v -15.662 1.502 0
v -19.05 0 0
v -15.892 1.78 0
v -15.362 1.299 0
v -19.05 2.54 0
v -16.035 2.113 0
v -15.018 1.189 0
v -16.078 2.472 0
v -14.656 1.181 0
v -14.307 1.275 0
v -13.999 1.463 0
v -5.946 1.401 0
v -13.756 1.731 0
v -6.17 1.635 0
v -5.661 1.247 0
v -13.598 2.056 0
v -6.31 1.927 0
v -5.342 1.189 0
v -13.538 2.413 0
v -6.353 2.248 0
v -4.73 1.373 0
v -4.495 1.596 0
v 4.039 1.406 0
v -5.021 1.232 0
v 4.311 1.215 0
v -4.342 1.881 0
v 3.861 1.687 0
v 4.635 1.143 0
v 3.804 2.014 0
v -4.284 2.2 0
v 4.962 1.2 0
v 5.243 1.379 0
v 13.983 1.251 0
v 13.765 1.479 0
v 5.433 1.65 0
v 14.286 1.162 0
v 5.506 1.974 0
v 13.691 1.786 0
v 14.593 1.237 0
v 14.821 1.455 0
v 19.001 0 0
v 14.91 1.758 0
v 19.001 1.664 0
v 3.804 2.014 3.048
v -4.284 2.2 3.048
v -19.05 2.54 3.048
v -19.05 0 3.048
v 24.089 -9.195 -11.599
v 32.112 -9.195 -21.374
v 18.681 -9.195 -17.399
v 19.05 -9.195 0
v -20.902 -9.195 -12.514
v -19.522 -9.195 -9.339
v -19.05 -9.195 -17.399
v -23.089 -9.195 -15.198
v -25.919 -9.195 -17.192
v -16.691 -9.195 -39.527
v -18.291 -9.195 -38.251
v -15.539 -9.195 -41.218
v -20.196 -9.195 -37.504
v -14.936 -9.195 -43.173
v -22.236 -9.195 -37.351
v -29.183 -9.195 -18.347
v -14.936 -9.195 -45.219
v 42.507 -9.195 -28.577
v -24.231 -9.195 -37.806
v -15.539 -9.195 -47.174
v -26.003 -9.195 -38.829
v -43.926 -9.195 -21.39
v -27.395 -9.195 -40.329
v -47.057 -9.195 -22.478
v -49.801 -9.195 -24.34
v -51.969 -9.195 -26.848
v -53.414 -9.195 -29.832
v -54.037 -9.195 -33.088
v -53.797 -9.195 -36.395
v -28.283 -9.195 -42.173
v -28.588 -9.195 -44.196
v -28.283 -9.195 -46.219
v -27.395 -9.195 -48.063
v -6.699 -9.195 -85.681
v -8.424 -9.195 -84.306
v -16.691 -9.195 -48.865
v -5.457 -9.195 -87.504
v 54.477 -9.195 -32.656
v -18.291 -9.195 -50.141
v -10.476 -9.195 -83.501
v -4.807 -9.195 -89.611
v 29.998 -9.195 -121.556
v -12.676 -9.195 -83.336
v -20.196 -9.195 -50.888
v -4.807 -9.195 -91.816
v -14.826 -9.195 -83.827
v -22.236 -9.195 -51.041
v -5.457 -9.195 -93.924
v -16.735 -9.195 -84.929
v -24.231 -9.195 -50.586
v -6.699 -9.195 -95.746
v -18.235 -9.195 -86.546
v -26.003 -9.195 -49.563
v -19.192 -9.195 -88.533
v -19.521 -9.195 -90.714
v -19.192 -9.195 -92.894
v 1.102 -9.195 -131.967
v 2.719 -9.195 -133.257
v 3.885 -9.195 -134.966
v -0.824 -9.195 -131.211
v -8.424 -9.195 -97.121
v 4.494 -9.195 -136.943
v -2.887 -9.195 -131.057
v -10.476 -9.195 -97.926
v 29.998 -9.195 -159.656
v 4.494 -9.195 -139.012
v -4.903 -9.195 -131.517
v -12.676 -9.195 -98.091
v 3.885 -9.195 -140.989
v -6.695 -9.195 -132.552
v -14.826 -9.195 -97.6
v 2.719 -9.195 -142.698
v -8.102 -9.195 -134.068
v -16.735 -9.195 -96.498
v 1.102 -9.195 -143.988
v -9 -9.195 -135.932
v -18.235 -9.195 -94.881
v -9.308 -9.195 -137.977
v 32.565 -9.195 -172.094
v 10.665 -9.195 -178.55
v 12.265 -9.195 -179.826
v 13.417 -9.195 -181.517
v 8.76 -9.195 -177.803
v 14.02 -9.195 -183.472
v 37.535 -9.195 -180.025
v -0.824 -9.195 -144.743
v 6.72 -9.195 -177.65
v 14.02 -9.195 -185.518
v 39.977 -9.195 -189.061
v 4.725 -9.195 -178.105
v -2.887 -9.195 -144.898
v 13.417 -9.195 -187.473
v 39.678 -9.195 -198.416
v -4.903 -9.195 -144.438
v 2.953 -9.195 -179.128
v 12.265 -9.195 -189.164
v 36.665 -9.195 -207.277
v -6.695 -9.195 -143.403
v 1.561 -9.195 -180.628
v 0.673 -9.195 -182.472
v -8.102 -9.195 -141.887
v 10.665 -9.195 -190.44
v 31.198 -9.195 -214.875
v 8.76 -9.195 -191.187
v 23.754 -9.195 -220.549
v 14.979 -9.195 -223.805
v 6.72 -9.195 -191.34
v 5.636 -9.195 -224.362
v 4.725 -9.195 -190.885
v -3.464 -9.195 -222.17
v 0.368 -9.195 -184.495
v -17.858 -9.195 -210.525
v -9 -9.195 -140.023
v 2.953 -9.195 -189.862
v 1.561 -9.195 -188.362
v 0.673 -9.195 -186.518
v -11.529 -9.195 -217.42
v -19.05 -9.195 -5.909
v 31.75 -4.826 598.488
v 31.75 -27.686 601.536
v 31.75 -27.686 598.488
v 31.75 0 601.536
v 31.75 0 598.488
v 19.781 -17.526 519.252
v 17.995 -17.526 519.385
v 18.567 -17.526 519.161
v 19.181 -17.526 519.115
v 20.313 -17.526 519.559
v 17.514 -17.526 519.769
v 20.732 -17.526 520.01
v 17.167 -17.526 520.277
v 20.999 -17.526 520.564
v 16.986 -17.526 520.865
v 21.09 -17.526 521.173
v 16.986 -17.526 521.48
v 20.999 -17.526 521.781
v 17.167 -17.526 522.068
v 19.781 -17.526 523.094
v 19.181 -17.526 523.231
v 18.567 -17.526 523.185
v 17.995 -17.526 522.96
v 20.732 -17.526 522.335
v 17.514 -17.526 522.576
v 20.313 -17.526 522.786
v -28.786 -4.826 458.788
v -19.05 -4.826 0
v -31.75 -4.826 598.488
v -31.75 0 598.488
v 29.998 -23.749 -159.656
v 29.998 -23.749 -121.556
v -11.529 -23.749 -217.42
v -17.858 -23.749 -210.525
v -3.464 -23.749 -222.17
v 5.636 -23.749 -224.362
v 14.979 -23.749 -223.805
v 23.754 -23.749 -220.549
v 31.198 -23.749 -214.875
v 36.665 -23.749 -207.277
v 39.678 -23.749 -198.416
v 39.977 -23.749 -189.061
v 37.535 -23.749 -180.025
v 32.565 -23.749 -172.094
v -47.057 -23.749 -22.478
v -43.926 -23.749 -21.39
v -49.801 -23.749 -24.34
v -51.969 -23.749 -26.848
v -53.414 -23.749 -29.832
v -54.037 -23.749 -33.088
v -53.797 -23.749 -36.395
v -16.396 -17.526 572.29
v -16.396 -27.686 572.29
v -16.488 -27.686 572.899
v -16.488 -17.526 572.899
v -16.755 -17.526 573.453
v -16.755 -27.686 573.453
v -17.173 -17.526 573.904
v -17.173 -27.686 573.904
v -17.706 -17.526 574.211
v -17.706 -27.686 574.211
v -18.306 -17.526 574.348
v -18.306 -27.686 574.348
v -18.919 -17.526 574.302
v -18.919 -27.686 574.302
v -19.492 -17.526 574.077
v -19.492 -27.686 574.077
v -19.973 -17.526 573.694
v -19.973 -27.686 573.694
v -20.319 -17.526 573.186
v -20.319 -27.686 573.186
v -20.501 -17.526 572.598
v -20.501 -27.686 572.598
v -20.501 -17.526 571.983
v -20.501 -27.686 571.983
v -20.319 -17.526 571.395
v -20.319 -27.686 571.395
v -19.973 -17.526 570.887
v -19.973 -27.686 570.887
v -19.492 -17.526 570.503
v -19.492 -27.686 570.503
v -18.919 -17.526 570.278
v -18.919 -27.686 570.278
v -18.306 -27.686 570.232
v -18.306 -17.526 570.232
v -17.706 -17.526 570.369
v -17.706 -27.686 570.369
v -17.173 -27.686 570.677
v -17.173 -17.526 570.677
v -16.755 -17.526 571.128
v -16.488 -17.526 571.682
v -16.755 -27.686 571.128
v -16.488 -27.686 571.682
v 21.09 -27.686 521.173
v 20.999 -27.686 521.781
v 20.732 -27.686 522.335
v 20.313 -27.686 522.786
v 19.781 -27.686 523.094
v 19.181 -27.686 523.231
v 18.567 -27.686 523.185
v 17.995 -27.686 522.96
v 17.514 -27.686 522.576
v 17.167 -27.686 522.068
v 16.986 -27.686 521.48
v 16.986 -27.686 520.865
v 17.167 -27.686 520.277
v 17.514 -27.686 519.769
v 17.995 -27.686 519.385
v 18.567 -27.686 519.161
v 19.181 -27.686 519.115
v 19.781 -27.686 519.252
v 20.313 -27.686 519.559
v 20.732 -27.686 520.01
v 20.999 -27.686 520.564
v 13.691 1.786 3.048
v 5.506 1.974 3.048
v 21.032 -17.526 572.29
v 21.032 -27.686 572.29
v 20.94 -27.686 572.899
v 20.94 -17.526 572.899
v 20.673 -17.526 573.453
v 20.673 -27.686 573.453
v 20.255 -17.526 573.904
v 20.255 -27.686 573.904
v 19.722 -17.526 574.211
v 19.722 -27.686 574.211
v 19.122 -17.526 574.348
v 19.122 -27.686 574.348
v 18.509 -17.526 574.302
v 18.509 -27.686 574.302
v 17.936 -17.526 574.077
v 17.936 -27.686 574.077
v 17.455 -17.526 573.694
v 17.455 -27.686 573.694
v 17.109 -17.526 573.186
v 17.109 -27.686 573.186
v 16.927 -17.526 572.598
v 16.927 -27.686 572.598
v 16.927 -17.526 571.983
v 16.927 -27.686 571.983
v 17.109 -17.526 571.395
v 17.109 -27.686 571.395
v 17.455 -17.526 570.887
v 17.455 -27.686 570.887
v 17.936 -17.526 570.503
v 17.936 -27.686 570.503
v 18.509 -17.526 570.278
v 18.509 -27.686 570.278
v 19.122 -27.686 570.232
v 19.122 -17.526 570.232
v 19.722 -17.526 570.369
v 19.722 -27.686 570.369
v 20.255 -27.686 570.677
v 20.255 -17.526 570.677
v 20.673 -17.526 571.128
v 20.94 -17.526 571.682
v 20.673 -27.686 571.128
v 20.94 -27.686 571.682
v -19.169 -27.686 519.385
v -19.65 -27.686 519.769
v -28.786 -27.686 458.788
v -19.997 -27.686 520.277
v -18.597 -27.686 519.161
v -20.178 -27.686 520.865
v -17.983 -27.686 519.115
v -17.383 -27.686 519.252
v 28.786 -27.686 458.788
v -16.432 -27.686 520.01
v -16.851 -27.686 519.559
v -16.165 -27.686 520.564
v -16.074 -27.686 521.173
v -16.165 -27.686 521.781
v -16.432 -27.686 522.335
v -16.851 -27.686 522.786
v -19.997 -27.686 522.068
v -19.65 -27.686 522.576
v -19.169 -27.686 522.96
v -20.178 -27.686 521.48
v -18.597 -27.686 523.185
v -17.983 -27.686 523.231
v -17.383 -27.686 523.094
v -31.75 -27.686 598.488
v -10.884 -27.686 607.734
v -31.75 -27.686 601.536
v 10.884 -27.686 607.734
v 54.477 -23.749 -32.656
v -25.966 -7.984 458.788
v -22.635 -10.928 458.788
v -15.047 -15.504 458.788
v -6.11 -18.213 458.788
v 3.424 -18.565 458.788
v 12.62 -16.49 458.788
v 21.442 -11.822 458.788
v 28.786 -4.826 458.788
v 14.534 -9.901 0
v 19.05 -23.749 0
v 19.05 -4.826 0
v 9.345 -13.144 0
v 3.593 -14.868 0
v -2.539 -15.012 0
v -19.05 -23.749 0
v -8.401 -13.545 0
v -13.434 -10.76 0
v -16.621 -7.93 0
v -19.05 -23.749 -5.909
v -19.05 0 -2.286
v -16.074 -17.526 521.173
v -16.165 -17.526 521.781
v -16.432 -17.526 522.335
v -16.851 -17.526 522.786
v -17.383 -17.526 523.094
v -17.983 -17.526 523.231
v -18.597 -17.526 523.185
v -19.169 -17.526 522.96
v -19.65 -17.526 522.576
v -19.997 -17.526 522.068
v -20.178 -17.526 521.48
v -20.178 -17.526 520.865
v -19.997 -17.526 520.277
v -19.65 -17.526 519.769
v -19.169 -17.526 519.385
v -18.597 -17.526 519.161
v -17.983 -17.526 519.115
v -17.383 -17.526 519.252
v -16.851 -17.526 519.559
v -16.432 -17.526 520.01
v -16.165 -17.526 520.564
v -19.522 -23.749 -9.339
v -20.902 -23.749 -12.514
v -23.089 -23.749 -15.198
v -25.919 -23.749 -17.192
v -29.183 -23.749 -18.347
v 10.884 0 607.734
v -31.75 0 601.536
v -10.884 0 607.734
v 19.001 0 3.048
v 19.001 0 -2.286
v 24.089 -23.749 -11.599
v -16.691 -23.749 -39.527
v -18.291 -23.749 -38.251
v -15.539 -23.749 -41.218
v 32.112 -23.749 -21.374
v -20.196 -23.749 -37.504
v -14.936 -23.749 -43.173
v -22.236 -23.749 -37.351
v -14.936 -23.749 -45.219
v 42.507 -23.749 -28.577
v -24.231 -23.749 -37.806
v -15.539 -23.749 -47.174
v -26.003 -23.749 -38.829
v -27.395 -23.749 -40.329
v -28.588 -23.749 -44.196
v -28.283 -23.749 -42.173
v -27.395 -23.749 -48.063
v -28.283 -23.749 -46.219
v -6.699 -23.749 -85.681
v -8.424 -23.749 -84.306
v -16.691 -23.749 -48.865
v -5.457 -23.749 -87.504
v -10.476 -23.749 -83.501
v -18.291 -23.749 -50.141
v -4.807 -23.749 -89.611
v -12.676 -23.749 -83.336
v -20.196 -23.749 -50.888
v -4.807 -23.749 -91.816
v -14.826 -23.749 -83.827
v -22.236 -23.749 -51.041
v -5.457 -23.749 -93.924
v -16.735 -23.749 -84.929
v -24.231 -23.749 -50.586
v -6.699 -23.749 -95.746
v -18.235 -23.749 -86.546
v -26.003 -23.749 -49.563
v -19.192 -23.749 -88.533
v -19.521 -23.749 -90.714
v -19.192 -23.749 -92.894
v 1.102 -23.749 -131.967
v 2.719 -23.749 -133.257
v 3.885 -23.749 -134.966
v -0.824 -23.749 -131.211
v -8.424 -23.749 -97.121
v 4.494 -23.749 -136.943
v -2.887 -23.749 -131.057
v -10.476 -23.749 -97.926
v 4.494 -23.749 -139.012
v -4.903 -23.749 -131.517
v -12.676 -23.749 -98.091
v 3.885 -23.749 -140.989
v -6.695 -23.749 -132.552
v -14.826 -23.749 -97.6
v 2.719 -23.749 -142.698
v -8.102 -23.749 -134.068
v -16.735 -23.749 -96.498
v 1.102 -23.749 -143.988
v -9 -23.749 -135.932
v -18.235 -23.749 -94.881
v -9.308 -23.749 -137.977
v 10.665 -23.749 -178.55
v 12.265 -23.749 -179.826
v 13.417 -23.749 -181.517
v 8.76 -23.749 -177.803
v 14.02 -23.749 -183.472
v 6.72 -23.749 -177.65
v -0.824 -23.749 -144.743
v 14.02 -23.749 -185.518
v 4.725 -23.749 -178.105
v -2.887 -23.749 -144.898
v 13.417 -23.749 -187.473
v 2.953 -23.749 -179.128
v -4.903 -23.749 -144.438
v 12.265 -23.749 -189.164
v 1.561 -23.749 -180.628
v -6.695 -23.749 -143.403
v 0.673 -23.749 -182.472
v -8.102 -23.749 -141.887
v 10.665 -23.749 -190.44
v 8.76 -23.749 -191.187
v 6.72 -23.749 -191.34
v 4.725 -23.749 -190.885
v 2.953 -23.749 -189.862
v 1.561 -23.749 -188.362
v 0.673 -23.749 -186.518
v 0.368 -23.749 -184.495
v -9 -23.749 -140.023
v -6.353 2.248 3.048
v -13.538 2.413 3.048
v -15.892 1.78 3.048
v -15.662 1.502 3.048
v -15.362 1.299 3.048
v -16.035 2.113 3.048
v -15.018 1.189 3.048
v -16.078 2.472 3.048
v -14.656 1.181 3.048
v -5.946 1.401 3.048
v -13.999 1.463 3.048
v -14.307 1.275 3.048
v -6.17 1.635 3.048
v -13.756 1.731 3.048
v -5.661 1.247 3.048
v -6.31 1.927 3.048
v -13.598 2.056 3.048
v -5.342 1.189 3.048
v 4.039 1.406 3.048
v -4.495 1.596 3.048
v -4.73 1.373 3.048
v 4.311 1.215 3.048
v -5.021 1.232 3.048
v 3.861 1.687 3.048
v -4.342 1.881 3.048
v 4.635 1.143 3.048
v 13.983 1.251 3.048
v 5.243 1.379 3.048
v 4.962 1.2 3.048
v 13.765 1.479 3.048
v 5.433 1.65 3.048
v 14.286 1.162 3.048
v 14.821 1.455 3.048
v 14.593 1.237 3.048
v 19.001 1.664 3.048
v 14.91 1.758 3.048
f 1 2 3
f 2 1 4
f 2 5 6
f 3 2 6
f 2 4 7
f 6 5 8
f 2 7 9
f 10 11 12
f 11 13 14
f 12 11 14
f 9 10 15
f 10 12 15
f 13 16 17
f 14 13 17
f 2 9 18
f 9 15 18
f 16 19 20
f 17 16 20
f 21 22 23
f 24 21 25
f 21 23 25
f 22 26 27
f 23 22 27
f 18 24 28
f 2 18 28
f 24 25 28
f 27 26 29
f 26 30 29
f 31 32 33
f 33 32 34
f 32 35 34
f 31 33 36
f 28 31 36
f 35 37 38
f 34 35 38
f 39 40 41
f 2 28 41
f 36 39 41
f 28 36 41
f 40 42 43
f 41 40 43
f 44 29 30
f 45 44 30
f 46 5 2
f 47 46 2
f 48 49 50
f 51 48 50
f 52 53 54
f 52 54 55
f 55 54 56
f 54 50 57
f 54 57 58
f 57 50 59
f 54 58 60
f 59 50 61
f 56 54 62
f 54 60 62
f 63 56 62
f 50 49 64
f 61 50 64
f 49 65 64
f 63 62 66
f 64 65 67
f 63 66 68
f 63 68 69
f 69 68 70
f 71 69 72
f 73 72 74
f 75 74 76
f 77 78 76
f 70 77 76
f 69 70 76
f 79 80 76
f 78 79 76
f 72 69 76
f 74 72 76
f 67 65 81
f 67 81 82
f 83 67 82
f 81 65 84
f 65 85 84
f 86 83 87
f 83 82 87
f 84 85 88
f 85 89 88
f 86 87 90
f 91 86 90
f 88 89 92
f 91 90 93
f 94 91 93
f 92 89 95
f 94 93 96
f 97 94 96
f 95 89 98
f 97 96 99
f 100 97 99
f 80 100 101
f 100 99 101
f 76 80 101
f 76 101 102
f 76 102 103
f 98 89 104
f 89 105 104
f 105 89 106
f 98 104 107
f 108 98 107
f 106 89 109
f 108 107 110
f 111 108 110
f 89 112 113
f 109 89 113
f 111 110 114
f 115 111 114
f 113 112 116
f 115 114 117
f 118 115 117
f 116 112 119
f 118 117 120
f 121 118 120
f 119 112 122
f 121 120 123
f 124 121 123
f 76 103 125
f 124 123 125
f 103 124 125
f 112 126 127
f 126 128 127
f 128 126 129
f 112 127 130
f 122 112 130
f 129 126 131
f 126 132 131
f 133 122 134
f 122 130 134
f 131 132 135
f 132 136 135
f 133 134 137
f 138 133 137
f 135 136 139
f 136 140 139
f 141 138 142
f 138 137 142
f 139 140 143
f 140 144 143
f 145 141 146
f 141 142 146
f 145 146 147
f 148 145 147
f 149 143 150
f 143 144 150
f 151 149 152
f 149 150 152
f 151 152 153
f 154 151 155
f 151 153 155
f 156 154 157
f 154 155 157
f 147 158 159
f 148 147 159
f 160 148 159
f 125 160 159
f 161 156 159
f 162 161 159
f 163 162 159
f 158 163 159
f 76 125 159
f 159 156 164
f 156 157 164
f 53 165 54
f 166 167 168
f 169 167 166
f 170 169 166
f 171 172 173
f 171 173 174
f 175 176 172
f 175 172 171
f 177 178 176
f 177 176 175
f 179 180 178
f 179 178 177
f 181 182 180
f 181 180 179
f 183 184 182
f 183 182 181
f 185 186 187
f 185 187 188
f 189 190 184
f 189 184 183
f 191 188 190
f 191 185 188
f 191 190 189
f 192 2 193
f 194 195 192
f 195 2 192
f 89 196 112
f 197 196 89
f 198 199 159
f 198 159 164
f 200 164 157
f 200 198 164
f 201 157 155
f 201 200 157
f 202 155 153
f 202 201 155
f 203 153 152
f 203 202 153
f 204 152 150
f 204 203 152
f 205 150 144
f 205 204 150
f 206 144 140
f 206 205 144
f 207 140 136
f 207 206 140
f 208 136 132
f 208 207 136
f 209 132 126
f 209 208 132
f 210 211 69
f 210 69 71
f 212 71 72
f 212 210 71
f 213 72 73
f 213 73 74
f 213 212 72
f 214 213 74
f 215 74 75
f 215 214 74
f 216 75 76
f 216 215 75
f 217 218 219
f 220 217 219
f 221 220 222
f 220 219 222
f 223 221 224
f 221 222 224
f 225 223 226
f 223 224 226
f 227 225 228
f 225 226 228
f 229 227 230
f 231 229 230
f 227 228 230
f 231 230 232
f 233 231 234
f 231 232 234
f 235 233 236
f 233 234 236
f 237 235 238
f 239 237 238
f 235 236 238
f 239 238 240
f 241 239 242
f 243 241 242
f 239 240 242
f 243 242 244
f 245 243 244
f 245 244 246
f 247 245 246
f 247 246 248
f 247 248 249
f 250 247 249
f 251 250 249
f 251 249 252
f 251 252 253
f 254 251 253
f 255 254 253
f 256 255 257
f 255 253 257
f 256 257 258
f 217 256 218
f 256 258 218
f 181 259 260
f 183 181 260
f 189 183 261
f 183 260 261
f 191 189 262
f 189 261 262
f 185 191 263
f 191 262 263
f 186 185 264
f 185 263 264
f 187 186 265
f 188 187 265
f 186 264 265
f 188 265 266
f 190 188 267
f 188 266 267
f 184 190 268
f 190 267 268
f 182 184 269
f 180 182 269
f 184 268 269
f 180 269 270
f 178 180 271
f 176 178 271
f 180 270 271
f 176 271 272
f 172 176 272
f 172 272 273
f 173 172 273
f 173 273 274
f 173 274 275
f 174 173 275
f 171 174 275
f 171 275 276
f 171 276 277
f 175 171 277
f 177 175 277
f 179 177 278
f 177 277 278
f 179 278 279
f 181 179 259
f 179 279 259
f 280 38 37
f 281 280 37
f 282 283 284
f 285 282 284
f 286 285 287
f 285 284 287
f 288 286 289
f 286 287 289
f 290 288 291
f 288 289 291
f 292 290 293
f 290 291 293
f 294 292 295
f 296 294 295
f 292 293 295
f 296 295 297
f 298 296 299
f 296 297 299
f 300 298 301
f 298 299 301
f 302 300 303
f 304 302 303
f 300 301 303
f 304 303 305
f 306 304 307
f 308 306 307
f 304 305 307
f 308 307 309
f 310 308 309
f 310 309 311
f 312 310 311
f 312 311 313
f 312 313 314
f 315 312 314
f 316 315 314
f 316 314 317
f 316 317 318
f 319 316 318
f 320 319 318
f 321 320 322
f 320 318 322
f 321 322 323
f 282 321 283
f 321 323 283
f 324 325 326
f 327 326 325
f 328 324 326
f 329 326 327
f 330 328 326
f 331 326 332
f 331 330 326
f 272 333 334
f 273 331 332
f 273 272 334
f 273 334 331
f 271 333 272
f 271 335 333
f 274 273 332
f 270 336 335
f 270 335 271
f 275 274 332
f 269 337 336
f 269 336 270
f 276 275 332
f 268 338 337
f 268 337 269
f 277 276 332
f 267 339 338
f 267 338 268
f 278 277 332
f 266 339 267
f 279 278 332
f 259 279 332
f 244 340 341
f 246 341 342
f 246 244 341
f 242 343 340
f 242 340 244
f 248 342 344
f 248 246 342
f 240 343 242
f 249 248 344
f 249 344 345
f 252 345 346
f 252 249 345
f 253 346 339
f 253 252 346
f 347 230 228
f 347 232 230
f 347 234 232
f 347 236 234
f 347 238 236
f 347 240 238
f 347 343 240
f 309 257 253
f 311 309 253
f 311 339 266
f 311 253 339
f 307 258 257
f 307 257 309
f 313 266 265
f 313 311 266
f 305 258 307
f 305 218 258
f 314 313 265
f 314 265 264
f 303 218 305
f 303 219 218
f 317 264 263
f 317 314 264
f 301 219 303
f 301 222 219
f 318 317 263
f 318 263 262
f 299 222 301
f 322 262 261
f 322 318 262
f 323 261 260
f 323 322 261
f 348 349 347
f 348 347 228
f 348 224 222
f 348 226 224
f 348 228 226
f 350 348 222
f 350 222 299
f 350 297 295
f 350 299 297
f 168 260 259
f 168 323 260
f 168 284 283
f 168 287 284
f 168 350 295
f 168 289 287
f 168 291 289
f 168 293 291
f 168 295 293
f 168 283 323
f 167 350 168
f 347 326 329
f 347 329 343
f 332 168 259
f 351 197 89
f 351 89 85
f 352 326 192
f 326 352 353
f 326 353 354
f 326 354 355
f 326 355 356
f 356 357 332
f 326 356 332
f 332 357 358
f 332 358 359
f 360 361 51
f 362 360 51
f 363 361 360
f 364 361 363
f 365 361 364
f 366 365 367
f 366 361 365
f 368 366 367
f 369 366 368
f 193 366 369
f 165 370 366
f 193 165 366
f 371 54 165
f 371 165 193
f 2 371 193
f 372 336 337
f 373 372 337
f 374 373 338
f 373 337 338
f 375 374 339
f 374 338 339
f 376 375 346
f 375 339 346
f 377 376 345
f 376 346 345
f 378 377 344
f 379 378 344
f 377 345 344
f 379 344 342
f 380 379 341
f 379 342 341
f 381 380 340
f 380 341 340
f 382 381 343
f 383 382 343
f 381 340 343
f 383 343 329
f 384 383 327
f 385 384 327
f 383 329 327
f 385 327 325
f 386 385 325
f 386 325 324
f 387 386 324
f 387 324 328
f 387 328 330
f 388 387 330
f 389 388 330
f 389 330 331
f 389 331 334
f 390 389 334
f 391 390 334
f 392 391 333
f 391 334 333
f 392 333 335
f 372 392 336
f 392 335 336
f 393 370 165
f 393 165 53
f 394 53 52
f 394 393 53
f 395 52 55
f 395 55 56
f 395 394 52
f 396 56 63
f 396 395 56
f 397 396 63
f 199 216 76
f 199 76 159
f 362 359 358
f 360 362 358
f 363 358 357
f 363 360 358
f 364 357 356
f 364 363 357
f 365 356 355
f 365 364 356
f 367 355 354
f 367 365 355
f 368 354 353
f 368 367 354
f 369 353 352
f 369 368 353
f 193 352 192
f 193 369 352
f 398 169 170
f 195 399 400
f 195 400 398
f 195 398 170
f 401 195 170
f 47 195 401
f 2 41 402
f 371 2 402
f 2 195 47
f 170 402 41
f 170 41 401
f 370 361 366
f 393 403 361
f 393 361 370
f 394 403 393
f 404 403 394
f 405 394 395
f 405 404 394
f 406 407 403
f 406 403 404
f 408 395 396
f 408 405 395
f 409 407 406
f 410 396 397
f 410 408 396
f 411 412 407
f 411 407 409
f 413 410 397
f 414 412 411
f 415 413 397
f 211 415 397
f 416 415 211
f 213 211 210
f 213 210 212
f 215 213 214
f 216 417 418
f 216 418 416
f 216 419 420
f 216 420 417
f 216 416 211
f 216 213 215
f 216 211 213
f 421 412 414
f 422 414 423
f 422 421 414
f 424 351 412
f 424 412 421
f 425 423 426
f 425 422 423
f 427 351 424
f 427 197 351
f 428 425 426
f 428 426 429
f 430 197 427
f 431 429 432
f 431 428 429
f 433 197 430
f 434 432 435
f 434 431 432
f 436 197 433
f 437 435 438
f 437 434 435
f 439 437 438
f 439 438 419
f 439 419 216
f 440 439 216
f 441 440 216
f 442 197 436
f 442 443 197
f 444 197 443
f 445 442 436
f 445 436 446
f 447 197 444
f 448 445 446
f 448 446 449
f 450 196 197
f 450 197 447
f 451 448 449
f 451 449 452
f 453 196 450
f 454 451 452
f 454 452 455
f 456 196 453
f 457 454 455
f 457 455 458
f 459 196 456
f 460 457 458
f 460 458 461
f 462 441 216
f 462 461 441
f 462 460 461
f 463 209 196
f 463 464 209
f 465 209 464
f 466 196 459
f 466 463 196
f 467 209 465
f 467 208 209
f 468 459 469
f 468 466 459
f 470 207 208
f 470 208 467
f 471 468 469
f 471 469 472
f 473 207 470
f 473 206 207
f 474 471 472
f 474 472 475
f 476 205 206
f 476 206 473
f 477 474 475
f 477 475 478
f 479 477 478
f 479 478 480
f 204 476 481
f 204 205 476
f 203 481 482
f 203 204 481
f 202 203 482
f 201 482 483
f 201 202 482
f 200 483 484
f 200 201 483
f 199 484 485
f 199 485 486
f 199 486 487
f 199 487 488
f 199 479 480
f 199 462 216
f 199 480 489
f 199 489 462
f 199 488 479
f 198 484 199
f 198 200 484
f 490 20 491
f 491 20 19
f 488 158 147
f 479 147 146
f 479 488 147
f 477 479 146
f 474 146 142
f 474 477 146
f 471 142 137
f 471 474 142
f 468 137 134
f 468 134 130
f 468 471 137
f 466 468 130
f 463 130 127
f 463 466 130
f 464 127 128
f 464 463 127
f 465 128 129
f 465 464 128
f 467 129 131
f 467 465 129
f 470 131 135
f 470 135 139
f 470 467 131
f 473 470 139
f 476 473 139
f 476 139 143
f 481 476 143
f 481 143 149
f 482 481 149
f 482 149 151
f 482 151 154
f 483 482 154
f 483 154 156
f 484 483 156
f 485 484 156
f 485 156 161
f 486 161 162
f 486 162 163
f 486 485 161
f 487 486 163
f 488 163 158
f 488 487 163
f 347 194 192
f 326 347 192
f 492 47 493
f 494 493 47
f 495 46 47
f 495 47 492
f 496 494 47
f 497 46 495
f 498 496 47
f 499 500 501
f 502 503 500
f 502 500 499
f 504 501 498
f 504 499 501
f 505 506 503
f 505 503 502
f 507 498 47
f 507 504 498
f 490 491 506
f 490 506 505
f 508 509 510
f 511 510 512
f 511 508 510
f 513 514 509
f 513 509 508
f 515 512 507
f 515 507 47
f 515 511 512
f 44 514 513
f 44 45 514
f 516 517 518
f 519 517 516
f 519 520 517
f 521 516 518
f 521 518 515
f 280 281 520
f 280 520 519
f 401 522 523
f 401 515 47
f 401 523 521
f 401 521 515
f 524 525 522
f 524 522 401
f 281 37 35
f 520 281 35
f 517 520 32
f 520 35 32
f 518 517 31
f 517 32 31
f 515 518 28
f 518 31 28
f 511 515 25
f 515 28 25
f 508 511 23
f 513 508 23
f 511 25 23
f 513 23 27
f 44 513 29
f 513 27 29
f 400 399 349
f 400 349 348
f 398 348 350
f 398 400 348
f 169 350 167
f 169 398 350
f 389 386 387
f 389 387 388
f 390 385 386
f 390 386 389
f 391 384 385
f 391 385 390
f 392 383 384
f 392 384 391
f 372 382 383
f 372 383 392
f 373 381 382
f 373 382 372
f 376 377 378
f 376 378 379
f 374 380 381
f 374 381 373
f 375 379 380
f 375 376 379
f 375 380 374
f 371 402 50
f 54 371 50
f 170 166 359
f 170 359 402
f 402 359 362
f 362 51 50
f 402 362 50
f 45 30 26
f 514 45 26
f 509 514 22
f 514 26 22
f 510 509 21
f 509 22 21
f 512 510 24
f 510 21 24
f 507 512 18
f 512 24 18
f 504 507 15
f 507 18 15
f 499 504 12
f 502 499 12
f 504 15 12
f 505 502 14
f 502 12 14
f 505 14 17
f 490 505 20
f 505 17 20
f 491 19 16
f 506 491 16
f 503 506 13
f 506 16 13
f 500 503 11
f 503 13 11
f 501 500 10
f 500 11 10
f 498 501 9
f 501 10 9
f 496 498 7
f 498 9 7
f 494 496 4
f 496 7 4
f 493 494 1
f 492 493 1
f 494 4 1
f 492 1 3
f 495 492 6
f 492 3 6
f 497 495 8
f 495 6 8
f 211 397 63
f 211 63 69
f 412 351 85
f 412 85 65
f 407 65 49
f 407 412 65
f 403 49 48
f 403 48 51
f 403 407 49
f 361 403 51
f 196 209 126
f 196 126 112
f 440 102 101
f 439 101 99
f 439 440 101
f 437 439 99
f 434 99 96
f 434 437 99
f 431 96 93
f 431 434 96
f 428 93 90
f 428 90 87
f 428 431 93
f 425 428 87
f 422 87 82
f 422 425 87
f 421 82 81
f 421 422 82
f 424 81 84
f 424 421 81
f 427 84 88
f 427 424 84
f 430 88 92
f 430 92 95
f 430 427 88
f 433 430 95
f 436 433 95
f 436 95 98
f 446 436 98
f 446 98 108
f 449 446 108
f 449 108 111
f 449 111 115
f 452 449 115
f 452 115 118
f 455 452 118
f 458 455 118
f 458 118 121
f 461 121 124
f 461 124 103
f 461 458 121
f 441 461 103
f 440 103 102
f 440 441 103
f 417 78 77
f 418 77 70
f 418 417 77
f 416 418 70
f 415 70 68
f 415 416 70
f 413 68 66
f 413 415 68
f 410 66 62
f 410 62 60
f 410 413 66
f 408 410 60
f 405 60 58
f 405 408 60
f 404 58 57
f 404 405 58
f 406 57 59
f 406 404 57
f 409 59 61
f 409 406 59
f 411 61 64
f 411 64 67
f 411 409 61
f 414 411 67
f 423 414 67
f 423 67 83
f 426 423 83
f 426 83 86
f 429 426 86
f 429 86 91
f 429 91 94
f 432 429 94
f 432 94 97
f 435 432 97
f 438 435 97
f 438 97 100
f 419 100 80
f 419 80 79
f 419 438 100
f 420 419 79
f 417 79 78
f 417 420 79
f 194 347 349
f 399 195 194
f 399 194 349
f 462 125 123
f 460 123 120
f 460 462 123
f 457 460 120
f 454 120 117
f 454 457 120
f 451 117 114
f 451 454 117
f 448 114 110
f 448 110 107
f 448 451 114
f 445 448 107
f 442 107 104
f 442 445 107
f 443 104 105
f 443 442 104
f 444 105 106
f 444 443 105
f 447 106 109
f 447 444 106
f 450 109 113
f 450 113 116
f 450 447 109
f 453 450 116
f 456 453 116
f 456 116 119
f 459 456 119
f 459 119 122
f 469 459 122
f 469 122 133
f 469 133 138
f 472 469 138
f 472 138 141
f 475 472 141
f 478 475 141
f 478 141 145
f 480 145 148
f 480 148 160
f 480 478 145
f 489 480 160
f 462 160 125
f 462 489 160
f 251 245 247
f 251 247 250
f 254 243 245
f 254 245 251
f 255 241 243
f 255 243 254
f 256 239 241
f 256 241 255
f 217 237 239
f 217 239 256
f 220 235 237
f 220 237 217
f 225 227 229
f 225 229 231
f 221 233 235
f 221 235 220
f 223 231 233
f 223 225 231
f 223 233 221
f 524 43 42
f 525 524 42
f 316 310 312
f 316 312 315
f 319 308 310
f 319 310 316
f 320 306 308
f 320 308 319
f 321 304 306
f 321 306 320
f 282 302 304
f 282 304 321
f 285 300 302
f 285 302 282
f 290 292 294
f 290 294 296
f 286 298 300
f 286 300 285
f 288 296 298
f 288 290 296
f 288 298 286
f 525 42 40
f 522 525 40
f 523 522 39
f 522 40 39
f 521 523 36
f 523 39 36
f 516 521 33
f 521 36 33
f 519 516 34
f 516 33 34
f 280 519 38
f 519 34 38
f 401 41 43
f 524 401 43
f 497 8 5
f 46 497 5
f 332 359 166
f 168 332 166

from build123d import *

# Parameters (mm, degrees)
SKETCH1_W           = 38.1
SKETCH1_H           = 4.826
SKETCH2_W           = 63.5
SKETCH2_H           = 4.826
BOSS_EXTRUDE1_DEPTH = 22.86
BOSS_EXTRUDE2_REACH = 601.968
SKETCH7_R           = 6.86435
SKETCH7_R_2         = 7.398290426
SKETCH7_R_3         = 6.940009574
BOSS_EXTRUDE3_DEPTH = 14.5542
BOSS_EXTRUDE4_REACH = 615.571
SKETCH9_R           = 2.06375
CUT_EXTRUDE1_DEPTH  = 10.16
BOSS_EXTRUDE5_DEPTH = 3.048


with BuildPart() as part:
    # Sketch1 → Loft1 section 0
    with BuildSketch(Plane.XY):
        with Locations((0, -2.413)):
            Rectangle(SKETCH1_W, SKETCH1_H)
    # Sketch2 → Loft1 section 1
    with BuildSketch(Plane.XY.offset(598.4875)):
        with Locations((0, -2.413)):
            Rectangle(SKETCH2_W, SKETCH2_H)
    loft()

    # Sketch5 → Boss-Extrude1 (add)
    with BuildSketch(Plane.XZ.offset(4.826)):
        Polygon((28.785543767, 458.7875), (31.75, 598.4875), (-31.75, 598.4875), (-28.785543767, 458.7875), align=None)
    extrude(amount=BOSS_EXTRUDE1_DEPTH)

    # Sketch4 for Loft2 → Loft2 section 0
    with BuildSketch(Plane.XY.offset(458.7875)):
        with BuildLine():
            Line((-28.785543767, -4.826), (28.785543767, -4.826))
            # circular arc as an exact rational Bezier (weights 1, cos(half-angle), 1)
            Bezier((28.785543767, -4.826), (0, -41.073048554), (-28.785543767, -4.826), weights=[1, 0.62189702, 1])
        make_face()
    # Sketch3 for Loft2 → Loft2 section 1
    with BuildSketch(Plane(origin=(0, 0, 0), x_dir=(-1, 0, 0), z_dir=(0, 0, -1))):
        with BuildLine():
            Line((19.05, -4.826), (-19.05, -4.826))
            Bezier((-19.05, -4.826), (0, -34.080271737), (19.05, -4.826), weights=[1, 0.545687389, 1])
        make_face()
    loft()

    # Boss-Extrude2: up to this face of the body (flat: up to its plane)
    boss_extrude2_end = Plane(part.part.faces().sort_by_distance((0, -27.686, 529.777696624))[0])
    # Sketch6 → Boss-Extrude2 (add, up to the picked face)
    with BuildSketch(Plane(origin=(0, 0, 0), x_dir=(1, 0, 0), z_dir=(0, 1, 0)), mode=Mode.PRIVATE) as boss_extrude2_sk1:
        with BuildLine():
            Line((-31.75, -598.4875), (-31.75, -601.5355))
            ThreePointArc((-31.75, -601.5355), (0, -608.5205), (31.75, -601.5355))
            Line((31.75, -601.5355), (31.75, -598.4875))
            Line((31.75, -598.4875), (-31.75, -598.4875))
        make_face()
    boss_extrude2_tool1 = split(extrude(boss_extrude2_sk1.sketch, amount=-BOSS_EXTRUDE2_REACH, mode=Mode.PRIVATE), bisect_by=boss_extrude2_end, keep=Keep.BOTH, mode=Mode.PRIVATE)
    add(boss_extrude2_tool1.solids().sort_by(Axis((0, 0, 602.638041), (0, -1, 0)))[0])

    # Sketch7 → Boss-Extrude3 (add)
    with BuildSketch(Plane(origin=(0, -23.749, 0), x_dir=(1, 0, 0), z_dir=(0, 1, 0))):
        with BuildLine():
            Line((-53.796563594, 36.394925453), (-17.858265722, 210.524988182))
            ThreePointArc((-17.858265722, 210.524988182), (27.686421042, 217.987818984), (32.564596867, 172.094292899))
            Line((32.564596867, 172.094292899), (29.99757559, 159.656431275))
            Line((29.99757559, 159.656431275), (29.99757559, 121.556431275))
            Line((29.99757559, 121.556431275), (54.47665, 32.656431275))
            ThreePointArc((54.47665, 32.656431275), (32.112450528, 21.373620039), (19.05, 0))
            Line((19.05, 0), (-19.05, 0))
            Line((-19.05, 0), (-19.05, 5.909460242))
            ThreePointArc((-19.05, 5.909460242), (-21.903905083, 13.930957291), (-29.182978723, 18.347321866))
            Line((-29.182978723, 18.347321866), (-43.925723247, 21.390042553))
            ThreePointArc((-43.925723247, 21.390042553), (-51.96875642, 26.848166031), (-53.796563594, 36.394925453))
        make_face()
        with Locations(Location((-21.72335, 44.196, 0), (0, 0, 180))):
            Circle(SKETCH7_R, mode=Mode.SUBTRACT)
        with Locations(Location((-12.122690426, 90.713602472, 0), (0, 0, 180))):
            Circle(SKETCH7_R_2, mode=Mode.SUBTRACT)
        with Locations(Location((-2.368009574, 137.977476641, 0), (0, 0, 180))):
            Circle(SKETCH7_R_3, mode=Mode.SUBTRACT)
        with Locations(Location((7.23265, 184.495079113, 0), (0, 0, 180))):
            Circle(SKETCH7_R, mode=Mode.SUBTRACT)
    extrude(amount=BOSS_EXTRUDE3_DEPTH)

    # Boss-Extrude4: up to this plane
    boss_extrude4_end = Plane(origin=(19.041425738, 0, -0.404062085), z_dir=(-0.999774928431425, 0, 0.021215383096688065))
    # Sketch8 → Boss-Extrude4 (add, up to the surface)
    with BuildSketch(Plane.ZY.offset(19.05), mode=Mode.PRIVATE) as boss_extrude4_sk1:
        Polygon((0, 0), (-2.286, 0), (-17.399, -9.1948), (0, -9.1948), align=None)
    boss_extrude4_tool1 = split(extrude(boss_extrude4_sk1.sketch, amount=-BOSS_EXTRUDE4_REACH, mode=Mode.PRIVATE), bisect_by=boss_extrude4_end, keep=Keep.BOTH, mode=Mode.PRIVATE)
    add(boss_extrude4_tool1.solids().sort_by_distance((-19.05, -5.773939, -5.888157))[0])

    # Sketch9 → Cut-Extrude1 (cut)
    with BuildSketch(Plane.XZ.offset(27.686)):
        with Locations((-18.459938241, 572.290233936)):
            Circle(SKETCH9_R)
        with Locations((18.968052603, 572.290233936)):
            Circle(SKETCH9_R)
        with Locations((19.026588432, 521.172733936)):
            Circle(SKETCH9_R)
        with Locations((-18.137388298, 521.172733936)):
            Circle(SKETCH9_R)
    extrude(amount=-CUT_EXTRUDE1_DEPTH, mode=Mode.SUBTRACT)

    # Sketch10 → Boss-Extrude5 (add)
    with BuildSketch(Plane.XY):
        with BuildLine():
            Line((-19.05, 0), (19.001490716, 0))
            Line((19.001490716, 0), (19.001490716, 1.6637))
            Line((19.001490716, 1.6637), (14.9098, 1.75792886))
            ThreePointArc((14.9098, 1.75792886), (14.286161326, 1.162367534), (13.6906, 1.786006208))
            Line((13.6906, 1.786006208), (5.505740514, 1.974497966))
            ThreePointArc((5.505740514, 1.974497966), (4.635244864, 1.143193615), (3.803940514, 2.013689264))
            Line((3.803940514, 2.013689264), (-4.283815101, 2.199944786))
            ThreePointArc((-4.283815101, 2.199944786), (-5.342420922, 1.188999326), (-6.353366381, 2.247605147))
            Line((-6.353366381, 2.247605147), (-13.5382, 2.413066988))
            ThreePointArc((-13.5382, 2.413066988), (-14.837447238, 1.172314226), (-16.0782, 2.471561463))
            Line((-16.0782, 2.471561463), (-19.05, 2.54))
            Line((-19.05, 2.54), (-19.05, 0))
        make_face()
    extrude(amount=BOSS_EXTRUDE5_DEPTH)


solid = part.part
